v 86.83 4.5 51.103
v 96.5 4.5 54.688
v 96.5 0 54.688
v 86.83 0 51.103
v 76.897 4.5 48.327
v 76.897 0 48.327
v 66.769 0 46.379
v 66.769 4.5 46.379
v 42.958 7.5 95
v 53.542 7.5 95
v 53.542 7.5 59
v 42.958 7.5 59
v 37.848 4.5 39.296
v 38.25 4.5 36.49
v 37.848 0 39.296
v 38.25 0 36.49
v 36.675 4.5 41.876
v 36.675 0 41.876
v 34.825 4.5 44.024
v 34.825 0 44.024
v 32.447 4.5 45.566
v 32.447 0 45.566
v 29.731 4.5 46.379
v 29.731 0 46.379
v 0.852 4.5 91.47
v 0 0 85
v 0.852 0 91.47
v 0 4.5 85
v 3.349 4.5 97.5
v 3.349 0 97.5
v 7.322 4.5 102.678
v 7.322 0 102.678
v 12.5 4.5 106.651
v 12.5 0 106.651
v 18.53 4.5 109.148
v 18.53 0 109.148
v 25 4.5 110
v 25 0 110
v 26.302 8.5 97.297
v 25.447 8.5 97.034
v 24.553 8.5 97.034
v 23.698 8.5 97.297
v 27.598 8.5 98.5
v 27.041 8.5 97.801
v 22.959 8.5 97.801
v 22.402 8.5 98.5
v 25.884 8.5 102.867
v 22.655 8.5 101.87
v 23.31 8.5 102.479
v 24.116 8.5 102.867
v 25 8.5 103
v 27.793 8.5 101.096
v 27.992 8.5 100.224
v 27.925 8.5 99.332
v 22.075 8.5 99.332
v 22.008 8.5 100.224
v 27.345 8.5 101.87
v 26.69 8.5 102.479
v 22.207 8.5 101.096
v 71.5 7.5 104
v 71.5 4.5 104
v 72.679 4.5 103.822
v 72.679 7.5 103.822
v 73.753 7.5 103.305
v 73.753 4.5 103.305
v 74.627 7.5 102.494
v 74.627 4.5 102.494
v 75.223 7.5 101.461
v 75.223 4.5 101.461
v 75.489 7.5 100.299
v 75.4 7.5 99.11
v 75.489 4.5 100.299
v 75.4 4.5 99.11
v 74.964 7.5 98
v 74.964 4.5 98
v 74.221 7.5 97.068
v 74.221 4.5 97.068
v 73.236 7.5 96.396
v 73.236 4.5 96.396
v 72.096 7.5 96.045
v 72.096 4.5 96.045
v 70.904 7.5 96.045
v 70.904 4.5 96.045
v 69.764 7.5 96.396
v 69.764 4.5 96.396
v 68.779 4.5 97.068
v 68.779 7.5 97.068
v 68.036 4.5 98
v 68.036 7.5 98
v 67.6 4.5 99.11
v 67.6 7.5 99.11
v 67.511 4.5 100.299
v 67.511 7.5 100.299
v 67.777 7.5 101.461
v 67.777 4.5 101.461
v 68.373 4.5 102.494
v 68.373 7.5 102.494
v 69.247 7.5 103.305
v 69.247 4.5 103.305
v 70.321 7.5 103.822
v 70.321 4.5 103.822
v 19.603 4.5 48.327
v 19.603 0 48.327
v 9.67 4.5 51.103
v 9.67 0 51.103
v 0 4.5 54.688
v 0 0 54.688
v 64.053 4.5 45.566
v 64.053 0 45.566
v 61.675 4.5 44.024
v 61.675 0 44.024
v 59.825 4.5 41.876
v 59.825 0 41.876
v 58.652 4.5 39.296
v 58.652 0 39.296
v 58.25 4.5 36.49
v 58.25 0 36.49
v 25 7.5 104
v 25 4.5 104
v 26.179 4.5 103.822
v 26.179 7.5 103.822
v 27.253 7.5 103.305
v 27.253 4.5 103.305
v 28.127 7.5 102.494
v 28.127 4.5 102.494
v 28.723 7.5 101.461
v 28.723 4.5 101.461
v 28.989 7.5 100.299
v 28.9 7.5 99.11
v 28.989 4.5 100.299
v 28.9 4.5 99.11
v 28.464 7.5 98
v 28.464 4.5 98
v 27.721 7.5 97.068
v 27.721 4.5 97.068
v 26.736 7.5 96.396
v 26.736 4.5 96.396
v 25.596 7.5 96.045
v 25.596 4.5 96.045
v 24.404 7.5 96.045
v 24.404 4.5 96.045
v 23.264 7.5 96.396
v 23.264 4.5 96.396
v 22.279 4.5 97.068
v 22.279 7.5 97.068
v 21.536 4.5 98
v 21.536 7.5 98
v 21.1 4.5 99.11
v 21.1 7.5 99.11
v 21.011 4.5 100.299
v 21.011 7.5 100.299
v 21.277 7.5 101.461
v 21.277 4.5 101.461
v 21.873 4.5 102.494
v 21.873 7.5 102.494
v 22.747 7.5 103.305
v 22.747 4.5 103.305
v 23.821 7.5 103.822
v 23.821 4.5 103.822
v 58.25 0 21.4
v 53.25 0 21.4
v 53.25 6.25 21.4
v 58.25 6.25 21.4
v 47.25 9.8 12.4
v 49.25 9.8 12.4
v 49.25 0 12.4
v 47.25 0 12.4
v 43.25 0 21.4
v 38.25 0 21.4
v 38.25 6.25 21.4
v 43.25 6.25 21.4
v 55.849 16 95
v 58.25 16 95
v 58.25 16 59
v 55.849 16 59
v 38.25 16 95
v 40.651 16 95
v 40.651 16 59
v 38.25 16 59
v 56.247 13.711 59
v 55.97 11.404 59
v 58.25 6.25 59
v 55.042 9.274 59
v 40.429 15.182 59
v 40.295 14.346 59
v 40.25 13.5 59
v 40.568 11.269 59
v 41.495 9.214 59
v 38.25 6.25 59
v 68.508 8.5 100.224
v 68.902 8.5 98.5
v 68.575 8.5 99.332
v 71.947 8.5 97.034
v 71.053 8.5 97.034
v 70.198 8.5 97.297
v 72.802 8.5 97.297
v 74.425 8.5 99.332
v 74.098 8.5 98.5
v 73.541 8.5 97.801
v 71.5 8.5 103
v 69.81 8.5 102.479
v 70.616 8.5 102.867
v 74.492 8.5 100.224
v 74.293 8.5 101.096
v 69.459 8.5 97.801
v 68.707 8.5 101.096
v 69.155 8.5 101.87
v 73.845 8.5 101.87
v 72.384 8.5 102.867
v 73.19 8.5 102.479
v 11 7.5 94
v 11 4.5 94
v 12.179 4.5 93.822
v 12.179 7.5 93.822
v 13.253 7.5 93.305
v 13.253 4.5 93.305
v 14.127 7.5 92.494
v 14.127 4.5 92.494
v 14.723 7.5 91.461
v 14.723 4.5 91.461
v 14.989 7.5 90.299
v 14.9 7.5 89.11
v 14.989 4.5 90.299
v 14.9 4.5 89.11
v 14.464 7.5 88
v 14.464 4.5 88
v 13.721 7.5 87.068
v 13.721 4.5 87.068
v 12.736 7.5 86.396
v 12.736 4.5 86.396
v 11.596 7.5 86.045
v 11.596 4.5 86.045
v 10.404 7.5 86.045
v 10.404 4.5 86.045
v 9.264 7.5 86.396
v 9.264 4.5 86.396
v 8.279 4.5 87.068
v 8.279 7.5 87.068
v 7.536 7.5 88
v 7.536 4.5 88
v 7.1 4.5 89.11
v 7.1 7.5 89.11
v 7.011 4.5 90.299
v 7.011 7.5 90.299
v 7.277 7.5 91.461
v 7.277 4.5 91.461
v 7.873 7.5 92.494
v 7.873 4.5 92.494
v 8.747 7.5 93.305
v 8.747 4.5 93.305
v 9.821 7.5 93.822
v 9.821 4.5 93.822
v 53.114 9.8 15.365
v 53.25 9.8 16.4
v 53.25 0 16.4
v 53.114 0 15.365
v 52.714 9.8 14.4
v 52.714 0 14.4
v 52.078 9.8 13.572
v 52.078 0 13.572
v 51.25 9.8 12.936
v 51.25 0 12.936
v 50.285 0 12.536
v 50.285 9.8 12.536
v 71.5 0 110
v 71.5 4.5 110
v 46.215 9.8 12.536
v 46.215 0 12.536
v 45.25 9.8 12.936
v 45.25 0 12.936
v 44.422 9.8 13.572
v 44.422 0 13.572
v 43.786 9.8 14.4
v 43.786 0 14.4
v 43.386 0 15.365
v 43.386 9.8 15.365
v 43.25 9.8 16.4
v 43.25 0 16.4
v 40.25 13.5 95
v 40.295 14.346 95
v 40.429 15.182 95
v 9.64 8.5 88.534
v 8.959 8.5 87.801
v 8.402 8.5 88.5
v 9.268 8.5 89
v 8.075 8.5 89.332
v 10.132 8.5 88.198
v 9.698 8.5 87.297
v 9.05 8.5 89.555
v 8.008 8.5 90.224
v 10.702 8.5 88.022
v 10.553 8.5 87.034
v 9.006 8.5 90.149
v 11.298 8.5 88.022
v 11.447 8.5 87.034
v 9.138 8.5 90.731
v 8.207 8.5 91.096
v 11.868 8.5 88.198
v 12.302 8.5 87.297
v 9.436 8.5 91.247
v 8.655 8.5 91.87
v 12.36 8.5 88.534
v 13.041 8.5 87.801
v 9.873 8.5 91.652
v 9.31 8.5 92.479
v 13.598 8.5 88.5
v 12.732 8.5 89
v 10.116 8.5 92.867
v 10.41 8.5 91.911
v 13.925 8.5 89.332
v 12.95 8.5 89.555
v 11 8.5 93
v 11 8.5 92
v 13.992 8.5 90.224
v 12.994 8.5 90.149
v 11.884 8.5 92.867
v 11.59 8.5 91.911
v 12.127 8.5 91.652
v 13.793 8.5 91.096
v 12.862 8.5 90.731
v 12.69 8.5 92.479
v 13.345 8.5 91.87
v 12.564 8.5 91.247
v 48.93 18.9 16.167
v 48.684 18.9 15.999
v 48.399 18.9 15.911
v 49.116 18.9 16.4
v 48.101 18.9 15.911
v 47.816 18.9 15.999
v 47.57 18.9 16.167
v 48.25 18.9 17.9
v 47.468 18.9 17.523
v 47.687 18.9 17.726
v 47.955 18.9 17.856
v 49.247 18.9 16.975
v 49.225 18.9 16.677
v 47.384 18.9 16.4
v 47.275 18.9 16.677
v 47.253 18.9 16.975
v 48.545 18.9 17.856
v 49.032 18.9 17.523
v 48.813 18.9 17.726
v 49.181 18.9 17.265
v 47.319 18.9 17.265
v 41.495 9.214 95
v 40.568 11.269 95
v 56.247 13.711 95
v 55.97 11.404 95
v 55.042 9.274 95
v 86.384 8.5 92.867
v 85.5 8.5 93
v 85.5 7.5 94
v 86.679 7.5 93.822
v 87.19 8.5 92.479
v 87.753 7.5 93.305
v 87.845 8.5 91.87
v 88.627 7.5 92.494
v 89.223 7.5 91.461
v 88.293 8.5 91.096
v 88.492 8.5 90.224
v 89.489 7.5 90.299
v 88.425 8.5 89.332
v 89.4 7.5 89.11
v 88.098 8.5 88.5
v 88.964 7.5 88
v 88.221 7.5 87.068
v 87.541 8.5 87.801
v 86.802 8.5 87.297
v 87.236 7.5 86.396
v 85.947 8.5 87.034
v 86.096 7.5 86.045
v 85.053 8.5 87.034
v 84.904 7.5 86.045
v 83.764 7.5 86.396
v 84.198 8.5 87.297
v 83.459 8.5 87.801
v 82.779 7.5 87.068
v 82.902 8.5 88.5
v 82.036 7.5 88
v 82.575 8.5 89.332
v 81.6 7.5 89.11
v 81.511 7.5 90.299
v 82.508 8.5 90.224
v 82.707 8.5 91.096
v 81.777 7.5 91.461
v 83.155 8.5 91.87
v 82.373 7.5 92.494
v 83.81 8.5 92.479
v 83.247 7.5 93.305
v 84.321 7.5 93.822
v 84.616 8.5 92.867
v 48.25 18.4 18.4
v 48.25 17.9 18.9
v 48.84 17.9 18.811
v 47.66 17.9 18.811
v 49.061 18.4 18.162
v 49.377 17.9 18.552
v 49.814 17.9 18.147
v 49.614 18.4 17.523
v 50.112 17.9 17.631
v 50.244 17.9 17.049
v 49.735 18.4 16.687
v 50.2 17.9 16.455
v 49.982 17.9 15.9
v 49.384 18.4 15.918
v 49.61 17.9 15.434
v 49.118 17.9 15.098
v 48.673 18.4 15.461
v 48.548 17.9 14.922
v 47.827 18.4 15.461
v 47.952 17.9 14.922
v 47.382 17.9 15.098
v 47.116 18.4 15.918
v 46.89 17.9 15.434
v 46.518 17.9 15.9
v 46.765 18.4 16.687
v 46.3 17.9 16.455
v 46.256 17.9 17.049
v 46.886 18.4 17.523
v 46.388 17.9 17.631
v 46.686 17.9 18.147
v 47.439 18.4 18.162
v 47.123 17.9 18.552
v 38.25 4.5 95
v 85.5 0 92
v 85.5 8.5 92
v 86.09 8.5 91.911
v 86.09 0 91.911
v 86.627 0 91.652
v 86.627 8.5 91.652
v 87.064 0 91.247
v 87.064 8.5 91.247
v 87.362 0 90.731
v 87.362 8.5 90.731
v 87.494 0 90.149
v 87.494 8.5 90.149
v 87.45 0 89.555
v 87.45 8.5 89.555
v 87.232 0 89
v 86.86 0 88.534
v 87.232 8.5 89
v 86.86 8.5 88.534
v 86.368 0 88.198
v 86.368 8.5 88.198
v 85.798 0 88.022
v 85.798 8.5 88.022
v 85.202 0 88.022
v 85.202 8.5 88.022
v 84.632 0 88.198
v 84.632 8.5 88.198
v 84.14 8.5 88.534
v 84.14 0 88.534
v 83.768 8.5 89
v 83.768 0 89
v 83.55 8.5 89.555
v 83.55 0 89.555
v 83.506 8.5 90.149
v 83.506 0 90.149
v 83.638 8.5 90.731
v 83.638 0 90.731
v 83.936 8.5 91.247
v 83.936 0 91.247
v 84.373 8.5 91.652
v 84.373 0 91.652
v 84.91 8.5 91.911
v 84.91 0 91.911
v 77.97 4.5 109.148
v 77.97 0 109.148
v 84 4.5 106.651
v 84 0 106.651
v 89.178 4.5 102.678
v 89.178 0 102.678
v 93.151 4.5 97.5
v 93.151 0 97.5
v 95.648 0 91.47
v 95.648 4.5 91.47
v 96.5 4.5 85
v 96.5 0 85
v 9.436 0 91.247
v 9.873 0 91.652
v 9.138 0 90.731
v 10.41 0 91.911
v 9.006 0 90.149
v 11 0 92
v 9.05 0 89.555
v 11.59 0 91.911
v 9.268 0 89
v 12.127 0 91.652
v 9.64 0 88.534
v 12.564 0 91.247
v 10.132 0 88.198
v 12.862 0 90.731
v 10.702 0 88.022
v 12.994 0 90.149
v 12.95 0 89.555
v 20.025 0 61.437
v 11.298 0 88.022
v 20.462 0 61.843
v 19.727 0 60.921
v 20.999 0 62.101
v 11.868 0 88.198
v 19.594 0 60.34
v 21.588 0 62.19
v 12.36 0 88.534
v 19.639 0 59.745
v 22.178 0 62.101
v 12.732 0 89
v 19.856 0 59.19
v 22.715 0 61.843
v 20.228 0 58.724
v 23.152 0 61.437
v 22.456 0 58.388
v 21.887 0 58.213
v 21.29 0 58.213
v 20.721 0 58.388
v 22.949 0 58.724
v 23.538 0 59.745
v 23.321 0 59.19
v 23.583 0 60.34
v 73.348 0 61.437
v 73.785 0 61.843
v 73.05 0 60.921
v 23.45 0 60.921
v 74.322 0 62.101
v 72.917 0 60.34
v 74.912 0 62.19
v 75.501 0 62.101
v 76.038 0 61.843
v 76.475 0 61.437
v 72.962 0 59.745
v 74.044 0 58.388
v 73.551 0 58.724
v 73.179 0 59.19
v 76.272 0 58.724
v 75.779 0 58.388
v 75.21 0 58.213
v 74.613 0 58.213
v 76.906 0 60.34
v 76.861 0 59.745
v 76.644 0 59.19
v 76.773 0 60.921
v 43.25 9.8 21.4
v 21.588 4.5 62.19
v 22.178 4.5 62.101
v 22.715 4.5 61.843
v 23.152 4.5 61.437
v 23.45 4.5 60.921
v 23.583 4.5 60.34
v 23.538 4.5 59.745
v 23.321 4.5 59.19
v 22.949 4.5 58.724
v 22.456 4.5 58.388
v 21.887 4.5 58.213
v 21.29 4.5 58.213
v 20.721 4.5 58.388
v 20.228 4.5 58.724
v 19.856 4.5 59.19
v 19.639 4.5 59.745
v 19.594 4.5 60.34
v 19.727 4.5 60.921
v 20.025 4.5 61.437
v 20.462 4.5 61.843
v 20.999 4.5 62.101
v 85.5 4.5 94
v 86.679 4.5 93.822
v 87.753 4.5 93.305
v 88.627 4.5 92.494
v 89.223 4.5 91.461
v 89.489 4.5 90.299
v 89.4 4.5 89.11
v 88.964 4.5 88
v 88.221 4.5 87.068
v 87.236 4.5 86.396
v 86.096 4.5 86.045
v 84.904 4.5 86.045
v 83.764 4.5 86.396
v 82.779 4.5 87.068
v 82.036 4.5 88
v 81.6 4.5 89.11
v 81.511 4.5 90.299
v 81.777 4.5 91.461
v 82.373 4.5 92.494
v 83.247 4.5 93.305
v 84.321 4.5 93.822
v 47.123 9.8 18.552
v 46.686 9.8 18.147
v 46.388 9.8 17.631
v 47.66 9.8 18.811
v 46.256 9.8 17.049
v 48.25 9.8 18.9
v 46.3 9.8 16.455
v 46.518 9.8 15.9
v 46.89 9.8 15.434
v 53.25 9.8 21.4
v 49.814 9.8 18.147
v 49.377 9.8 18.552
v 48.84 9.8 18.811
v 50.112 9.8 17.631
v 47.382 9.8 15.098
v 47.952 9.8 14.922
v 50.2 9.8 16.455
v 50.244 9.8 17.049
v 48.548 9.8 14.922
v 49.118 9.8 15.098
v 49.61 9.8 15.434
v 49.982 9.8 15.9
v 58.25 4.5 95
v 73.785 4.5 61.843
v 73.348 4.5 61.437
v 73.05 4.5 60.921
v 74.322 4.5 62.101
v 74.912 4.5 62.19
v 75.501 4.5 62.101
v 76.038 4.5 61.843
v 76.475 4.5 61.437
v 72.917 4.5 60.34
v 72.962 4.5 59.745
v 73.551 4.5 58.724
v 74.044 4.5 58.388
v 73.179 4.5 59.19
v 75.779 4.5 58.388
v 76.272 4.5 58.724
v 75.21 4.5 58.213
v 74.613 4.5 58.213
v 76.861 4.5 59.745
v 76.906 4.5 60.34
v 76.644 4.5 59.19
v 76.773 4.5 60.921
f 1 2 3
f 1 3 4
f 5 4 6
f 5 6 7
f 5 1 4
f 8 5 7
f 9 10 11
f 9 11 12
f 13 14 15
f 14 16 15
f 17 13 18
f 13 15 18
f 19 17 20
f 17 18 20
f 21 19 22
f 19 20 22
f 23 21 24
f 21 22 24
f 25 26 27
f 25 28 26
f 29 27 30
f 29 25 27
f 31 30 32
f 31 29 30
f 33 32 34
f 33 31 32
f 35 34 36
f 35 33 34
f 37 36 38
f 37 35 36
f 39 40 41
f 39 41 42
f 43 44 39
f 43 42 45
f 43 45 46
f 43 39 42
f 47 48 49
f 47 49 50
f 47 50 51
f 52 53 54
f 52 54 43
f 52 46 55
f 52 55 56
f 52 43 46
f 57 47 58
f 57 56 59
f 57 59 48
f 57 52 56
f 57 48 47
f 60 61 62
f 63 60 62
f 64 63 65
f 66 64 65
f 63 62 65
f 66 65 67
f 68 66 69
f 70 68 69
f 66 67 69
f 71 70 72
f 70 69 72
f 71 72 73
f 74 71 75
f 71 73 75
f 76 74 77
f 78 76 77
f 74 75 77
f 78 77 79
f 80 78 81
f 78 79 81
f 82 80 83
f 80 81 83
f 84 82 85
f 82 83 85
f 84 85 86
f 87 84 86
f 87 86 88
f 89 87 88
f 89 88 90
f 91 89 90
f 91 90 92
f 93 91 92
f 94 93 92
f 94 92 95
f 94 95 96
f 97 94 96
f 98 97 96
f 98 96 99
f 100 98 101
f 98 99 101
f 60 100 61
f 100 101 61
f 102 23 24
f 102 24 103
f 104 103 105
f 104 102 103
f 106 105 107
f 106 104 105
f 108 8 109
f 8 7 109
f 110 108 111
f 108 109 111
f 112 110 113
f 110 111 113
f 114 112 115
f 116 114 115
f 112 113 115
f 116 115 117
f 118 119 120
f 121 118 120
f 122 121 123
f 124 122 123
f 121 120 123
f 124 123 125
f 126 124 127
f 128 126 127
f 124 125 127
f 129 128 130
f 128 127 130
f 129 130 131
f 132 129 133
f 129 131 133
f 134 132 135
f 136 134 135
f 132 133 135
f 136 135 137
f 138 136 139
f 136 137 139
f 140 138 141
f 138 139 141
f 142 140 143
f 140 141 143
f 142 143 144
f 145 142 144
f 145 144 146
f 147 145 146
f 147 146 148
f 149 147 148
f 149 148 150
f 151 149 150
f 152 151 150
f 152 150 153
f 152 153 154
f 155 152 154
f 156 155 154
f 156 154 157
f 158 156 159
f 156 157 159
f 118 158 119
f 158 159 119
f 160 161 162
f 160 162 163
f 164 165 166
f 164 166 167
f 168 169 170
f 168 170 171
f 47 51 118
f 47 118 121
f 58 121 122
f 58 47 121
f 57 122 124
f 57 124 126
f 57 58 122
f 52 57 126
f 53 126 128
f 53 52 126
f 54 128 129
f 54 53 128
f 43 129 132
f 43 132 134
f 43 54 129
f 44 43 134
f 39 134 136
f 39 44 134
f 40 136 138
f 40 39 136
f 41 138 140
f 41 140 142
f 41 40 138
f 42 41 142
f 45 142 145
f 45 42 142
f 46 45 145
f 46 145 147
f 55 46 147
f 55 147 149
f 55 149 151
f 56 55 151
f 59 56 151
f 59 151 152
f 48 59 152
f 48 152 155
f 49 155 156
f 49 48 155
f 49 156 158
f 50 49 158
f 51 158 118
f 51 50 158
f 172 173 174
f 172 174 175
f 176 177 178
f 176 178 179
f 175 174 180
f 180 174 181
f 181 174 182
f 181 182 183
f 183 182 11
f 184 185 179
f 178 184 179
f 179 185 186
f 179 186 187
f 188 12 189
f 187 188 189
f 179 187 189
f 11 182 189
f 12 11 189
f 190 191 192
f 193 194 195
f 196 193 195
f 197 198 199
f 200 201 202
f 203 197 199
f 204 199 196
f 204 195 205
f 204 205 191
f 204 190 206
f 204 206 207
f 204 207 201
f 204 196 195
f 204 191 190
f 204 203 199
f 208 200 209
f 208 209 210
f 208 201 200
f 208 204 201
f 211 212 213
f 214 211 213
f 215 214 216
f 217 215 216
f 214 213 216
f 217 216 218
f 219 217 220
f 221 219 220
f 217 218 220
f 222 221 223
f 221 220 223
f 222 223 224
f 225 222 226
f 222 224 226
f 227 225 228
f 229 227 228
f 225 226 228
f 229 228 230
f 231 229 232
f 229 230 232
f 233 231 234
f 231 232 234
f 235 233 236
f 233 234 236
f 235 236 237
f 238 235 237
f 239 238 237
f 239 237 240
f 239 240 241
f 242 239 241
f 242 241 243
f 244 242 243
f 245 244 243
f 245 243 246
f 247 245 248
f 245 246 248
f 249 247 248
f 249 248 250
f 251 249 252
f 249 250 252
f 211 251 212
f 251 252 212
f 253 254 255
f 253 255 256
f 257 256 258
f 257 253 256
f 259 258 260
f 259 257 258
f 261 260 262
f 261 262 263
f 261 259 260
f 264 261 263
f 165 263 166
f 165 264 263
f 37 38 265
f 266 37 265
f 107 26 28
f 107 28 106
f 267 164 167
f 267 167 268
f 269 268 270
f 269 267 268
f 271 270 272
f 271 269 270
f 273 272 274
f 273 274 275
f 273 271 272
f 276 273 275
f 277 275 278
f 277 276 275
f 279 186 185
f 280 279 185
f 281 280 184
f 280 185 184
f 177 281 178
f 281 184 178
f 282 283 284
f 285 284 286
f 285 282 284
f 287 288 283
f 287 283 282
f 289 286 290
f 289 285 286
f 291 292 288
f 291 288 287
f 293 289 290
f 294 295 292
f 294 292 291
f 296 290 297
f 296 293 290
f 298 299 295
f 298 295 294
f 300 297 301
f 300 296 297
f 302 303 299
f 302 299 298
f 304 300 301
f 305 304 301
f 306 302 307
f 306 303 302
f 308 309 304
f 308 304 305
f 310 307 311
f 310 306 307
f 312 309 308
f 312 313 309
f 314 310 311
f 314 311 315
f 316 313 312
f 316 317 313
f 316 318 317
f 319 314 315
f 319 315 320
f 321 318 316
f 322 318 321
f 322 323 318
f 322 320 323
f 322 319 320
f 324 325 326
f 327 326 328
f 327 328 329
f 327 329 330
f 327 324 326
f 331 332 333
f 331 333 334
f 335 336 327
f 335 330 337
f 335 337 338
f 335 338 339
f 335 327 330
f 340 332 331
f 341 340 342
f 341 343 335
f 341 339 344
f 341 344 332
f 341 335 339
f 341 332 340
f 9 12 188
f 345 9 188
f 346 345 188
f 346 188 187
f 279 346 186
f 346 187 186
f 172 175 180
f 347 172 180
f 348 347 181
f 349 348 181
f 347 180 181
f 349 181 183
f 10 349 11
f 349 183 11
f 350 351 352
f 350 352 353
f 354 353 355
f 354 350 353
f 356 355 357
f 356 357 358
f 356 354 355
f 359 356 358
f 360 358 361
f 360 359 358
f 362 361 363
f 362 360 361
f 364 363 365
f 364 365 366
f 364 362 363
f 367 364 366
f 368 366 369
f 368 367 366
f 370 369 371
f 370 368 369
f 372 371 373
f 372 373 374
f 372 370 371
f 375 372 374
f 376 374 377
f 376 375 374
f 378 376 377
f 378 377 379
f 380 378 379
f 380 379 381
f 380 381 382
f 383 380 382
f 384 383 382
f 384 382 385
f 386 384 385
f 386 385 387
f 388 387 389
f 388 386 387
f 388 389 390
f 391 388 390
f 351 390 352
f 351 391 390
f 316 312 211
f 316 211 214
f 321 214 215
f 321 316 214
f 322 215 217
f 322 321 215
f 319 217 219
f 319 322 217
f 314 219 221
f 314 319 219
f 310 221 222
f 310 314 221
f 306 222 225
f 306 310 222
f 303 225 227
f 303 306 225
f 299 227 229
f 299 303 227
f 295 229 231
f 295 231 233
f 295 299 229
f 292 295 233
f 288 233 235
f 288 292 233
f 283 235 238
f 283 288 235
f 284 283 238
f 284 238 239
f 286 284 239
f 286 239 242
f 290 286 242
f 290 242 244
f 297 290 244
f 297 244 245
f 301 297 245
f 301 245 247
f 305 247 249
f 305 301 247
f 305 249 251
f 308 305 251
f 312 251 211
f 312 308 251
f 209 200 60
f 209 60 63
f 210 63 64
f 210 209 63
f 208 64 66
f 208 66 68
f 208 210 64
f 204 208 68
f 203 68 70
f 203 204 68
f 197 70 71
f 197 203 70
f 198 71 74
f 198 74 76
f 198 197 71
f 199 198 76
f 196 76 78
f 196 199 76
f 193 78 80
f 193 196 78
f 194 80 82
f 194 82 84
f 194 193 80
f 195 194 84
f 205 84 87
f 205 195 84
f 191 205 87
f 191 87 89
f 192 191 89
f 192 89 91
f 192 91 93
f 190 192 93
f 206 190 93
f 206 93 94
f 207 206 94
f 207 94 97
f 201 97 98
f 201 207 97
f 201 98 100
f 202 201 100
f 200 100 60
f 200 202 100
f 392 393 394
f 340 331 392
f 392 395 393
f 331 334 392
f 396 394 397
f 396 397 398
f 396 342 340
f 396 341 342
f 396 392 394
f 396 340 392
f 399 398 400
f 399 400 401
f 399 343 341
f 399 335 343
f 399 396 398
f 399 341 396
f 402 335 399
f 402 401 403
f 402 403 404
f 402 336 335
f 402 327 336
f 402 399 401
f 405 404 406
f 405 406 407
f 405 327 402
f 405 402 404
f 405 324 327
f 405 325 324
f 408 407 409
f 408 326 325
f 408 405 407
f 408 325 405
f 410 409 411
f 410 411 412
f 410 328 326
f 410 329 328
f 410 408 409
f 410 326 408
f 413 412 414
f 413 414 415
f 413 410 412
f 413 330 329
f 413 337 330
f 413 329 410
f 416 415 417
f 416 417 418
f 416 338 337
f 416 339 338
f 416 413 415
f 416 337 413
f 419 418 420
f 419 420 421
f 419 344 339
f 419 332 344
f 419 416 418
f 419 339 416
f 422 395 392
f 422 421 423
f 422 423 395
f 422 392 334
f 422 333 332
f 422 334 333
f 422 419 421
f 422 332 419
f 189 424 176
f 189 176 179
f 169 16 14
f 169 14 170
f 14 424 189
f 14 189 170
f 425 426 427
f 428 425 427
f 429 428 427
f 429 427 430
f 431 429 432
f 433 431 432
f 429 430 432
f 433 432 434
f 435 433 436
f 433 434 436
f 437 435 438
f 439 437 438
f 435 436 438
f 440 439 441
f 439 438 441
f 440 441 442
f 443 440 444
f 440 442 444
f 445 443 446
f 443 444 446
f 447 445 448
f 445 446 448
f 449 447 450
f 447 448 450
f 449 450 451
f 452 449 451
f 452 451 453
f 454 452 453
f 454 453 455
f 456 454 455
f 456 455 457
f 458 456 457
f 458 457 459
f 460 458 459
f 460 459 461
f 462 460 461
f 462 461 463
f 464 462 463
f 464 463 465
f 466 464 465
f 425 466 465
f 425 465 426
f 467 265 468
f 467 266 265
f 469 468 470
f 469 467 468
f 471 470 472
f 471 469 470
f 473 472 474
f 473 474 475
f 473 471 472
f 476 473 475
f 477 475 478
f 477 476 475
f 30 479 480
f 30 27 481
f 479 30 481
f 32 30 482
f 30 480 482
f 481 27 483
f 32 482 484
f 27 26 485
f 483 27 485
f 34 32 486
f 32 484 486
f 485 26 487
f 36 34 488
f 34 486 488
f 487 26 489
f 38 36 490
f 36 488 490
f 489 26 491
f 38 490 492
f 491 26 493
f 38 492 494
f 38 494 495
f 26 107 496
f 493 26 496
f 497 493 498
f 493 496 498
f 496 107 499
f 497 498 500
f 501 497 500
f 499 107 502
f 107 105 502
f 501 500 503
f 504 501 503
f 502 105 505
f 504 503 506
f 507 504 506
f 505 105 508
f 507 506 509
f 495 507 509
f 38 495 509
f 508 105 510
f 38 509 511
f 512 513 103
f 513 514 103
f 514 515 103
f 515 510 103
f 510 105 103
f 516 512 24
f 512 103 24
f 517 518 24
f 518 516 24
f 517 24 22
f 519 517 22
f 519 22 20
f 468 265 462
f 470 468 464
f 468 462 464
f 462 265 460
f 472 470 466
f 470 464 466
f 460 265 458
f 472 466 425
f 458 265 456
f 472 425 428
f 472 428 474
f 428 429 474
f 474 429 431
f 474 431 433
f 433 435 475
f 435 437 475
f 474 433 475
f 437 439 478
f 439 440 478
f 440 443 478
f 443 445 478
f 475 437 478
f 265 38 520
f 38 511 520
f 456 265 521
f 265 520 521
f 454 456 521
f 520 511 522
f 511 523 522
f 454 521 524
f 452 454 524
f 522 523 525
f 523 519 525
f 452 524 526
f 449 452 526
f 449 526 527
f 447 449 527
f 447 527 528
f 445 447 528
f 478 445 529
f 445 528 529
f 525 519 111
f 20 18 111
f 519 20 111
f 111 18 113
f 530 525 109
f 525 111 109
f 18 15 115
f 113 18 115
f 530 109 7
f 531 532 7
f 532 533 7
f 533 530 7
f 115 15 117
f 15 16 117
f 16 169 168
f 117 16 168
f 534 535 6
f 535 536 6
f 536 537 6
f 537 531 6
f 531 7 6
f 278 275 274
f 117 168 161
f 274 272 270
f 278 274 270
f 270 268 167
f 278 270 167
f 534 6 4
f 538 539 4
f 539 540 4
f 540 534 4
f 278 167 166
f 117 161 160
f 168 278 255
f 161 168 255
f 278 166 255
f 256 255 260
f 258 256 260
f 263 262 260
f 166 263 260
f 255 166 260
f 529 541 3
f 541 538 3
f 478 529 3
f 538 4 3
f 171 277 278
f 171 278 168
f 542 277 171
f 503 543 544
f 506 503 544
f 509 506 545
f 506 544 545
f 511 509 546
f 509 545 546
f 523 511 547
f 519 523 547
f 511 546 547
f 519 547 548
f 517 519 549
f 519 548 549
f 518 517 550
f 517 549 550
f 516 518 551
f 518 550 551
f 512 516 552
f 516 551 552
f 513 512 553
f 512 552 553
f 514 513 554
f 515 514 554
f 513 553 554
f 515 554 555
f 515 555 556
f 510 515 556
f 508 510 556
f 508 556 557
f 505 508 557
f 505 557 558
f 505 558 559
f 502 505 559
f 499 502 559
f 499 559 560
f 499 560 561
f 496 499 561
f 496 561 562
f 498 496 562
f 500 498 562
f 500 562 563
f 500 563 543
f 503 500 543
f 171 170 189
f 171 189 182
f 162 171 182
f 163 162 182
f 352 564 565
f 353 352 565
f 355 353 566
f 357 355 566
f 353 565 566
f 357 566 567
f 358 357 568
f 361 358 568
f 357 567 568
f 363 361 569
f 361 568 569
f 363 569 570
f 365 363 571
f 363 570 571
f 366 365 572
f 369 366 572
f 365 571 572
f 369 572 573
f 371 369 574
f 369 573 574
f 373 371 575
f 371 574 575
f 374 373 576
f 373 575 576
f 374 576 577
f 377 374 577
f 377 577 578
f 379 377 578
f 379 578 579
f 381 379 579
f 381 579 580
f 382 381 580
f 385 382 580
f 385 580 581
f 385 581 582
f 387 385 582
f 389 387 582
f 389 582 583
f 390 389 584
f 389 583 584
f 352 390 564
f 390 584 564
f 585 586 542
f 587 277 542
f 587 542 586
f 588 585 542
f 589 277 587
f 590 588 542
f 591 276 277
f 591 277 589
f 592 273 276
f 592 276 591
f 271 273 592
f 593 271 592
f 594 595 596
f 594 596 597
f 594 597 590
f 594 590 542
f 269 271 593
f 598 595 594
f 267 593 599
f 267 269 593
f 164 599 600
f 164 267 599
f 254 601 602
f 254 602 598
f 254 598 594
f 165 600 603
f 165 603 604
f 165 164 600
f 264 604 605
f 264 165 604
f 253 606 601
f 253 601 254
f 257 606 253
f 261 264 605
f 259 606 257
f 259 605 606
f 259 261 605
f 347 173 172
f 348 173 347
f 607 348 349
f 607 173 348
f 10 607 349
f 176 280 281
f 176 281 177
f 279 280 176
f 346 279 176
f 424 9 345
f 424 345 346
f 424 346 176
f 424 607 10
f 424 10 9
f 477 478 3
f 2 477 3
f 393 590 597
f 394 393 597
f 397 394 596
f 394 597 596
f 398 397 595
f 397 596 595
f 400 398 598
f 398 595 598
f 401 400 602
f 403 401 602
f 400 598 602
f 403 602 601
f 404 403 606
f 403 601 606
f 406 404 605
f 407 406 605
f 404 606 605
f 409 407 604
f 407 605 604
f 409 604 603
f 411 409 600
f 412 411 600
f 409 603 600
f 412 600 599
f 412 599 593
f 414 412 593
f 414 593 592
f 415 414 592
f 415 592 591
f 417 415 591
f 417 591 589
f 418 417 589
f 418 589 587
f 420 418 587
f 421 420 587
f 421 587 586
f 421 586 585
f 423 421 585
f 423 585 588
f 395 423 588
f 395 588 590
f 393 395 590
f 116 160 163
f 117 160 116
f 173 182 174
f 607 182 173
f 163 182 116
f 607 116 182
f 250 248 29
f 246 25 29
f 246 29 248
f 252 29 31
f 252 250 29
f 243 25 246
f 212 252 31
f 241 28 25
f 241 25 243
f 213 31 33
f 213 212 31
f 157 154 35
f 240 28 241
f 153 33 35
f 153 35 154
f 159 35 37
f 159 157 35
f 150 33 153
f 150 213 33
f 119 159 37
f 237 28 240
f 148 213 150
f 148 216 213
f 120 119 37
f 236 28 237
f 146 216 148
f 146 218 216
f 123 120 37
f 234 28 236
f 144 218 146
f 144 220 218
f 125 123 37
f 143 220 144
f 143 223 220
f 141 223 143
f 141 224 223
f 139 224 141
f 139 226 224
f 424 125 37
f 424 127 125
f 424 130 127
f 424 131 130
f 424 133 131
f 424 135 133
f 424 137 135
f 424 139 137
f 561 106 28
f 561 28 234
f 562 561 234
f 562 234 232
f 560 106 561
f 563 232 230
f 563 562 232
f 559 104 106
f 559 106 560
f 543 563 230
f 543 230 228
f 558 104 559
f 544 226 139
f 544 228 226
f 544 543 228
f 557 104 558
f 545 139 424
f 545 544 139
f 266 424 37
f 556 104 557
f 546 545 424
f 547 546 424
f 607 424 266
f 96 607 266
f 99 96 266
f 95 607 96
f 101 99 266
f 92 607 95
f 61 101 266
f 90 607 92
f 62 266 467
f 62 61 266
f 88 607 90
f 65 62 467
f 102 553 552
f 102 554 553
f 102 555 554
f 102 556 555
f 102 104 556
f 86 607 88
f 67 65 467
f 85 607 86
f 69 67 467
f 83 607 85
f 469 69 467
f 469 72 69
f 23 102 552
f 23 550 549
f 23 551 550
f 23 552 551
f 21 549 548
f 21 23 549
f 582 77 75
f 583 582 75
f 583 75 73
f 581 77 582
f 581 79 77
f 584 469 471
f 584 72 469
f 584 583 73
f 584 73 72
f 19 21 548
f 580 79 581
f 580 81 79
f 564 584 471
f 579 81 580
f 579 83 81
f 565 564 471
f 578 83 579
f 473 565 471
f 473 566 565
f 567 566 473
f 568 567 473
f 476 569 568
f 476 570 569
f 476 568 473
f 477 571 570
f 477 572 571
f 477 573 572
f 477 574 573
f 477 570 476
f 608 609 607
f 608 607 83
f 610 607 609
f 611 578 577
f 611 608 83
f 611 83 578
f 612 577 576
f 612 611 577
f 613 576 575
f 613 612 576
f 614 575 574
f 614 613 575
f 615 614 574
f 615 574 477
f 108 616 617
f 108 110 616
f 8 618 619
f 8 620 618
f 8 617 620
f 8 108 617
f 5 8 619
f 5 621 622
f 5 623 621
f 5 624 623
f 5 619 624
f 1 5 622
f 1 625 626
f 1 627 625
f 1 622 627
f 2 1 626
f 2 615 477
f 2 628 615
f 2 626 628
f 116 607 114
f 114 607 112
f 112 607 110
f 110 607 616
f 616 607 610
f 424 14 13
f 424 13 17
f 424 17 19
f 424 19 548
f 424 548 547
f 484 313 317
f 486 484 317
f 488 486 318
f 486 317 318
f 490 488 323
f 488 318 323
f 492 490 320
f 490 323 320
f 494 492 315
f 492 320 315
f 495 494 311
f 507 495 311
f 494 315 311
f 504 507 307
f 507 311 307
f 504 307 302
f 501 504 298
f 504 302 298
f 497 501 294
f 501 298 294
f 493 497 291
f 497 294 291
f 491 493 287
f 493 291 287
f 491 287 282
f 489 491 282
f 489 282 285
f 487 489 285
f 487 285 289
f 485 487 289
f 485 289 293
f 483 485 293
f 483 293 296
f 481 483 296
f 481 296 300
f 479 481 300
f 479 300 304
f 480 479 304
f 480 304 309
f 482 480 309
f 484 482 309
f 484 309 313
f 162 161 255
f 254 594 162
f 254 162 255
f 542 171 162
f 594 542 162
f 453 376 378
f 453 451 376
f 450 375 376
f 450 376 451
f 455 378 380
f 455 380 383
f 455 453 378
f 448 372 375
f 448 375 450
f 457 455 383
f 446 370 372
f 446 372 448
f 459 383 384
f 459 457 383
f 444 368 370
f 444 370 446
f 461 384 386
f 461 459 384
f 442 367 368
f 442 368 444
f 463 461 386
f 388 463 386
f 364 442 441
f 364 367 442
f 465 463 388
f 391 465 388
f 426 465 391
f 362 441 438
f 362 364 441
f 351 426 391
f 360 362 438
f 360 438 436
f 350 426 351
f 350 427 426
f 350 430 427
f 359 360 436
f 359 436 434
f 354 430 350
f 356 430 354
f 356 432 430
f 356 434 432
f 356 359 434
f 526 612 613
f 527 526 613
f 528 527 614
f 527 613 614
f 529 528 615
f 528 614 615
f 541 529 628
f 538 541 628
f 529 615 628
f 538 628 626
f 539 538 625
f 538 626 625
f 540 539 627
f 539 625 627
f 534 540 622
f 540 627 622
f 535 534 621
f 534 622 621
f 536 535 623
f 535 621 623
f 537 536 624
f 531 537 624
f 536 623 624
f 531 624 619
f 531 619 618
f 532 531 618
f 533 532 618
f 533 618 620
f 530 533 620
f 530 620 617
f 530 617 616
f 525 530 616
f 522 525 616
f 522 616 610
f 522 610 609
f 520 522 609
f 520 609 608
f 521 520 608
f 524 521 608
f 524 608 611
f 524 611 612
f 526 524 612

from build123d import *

# Parameters (mm, degrees)
SKETCH1_W           = 96.5
SKETCH1_H           = 110
BOSS_EXTRUDE1_DEPTH = 4.5
SKETCH2_R           = 4
BOSS_EXTRUDE2_DEPTH = 4
SKETCH3_R           = 2
BOSS_EXTRUDE3_DEPTH = 14.4
SKETCH4_W           = 20
SKETCH4_H           = 37.6
BOSS_EXTRUDE4_DEPTH = 1.75
BOSS_EXTRUDE5_DEPTH = 11.5
BOSS_EXTRUDE6_DEPTH = 5.3
CHAMFER2_SIZE       = 1
CUT_EXTRUDE6_DEPTH  = 115.67545509
CHAMFER3_SIZE       = 1
SKETCH2_4_R         = 4
BOSS_EXTRUDE8_DEPTH = 4
CUT_EXTRUDE10_DEPTH = 148.036084007
FILLET1_R           = 10
SKETCH21_R          = 2
CUT_EXTRUDE11_DEPTH = 148.036084007
CHAMFER4_SIZE       = 1
SKETCH22_R          = 2
CUT_EXTRUDE12_DEPTH = 147.698363999
FILLET2_R           = 25


with BuildPart() as part:
    # Sketch1 → Boss-Extrude1 (new body)
    with BuildSketch(Plane(origin=(0, 0, 0), x_dir=(1, 0, 0), z_dir=(0, 1, 0))):
        with Locations((48.25, -55)):
            Rectangle(SKETCH1_W, SKETCH1_H)
    extrude(amount=BOSS_EXTRUDE1_DEPTH)

    # Sketch2 → Boss-Extrude2 (add)
    with BuildSketch(Plane(origin=(0, 4.5, 0), x_dir=(1, 0, 0), z_dir=(0, 1, 0))):
        with Locations(Location((25, -100, 0), (0, 0, 270))):
            Circle(SKETCH2_R)
        with Locations(Location((71.5, -100, 0), (0, 0, 270))):
            Circle(SKETCH2_R)
    extrude(amount=BOSS_EXTRUDE2_DEPTH)

    # Sketch3 → Boss-Extrude3 (add)
    with BuildSketch(Plane(origin=(0, 4.5, 0), x_dir=(1, 0, 0), z_dir=(0, 1, 0))):
        with Locations(Location((48.25, -16.9, 0), (0, 0, 270))):
            Circle(SKETCH3_R)
    extrude(amount=BOSS_EXTRUDE3_DEPTH)

    # Sketch4 → Boss-Extrude4 (add)
    with BuildSketch(Plane(origin=(0, 4.5, 0), x_dir=(1, 0, 0), z_dir=(0, 1, 0))):
        with Locations((48.25, -40.2)):
            Rectangle(SKETCH4_W, SKETCH4_H)
    extrude(amount=BOSS_EXTRUDE4_DEPTH)

    # Sketch4<3> → Boss-Extrude5 (add)
    with BuildSketch(Plane(origin=(0, 4.5, 0), x_dir=(1, 0, 0), z_dir=(0, 1, 0))):
        Polygon((58.25, -59), (58.25, -95), (38.25, -95), (38.25, -59), (48.25, -59), align=None)
    extrude(amount=BOSS_EXTRUDE5_DEPTH)

    # Sketch4<5> → Boss-Extrude6 (add)
    with BuildSketch(Plane(origin=(0, 4.5, 0), x_dir=(1, 0, 0), z_dir=(0, 1, 0))):
        with BuildLine():
            Line((49.25, -12.4), (47.25, -12.4))
            ThreePointArc((47.25, -12.4), (44.421572875, -13.571572875), (43.25, -16.4))
            Line((43.25, -16.4), (43.25, -21.4))
            Line((43.25, -21.4), (53.25, -21.4))
            Line((53.25, -21.4), (53.25, -16.4))
            ThreePointArc((53.25, -16.4), (52.078427125, -13.571572875), (49.25, -12.4))
        make_face()
    extrude(amount=BOSS_EXTRUDE6_DEPTH)

    # Chamfer2
    chamfer2_edges = [part.edges().sort_by_distance(p)[0] for p in [
        (48.25, 18.9, 14.9),
    ]]
    chamfer(chamfer2_edges, length=CHAMFER2_SIZE)

    # Sketch9 → Cut-Extrude6 (cut, through all)
    with BuildSketch(Plane(origin=(0, 0, 59), x_dir=(-1, 0, 0), z_dir=(0, 0, -1))):
        with BuildLine():
            ThreePointArc((-55.849342077, 16), (-55.970490222, 11.403805654), (-53.541502622, 7.5))
            Line((-53.541502622, 7.5), (-42.958497378, 7.5))
            ThreePointArc((-42.958497378, 7.5), (-40.958497378, 10.208497378), (-40.25, 13.5))
            ThreePointArc((-40.25, 13.5), (-40.350799515, 14.765950905), (-40.650657923, 16))
            Line((-40.650657923, 16), (-55.849342077, 16))
        make_face()
    extrude(amount=-CUT_EXTRUDE6_DEPTH, mode=Mode.SUBTRACT)

    # Chamfer3
    chamfer3_edges = [part.edges().sort_by_distance(p)[0] for p in [
        (25, 8.5, 96),
        (71.5, 8.5, 96),
    ]]
    chamfer(chamfer3_edges, length=CHAMFER3_SIZE)

    # Sketch2<4> → Boss-Extrude8 (add)
    with BuildSketch(Plane(origin=(0, 4.5, 0), x_dir=(1, 0, 0), z_dir=(0, 1, 0))):
        with Locations(Location((11, -90, 0), (0, 0, 270))):
            Circle(SKETCH2_4_R)
        with Locations(Location((85.5, -90, 0), (0, 0, 270))):
            Circle(SKETCH2_4_R)
    extrude(amount=BOSS_EXTRUDE8_DEPTH)

    # Sketch20 → Cut-Extrude10 (cut, through all)
    with BuildSketch(Plane(origin=(0, 4.5, 0), x_dir=(1, 0, 0), z_dir=(0, 1, 0))):
        with BuildLine():
            Line((0, 0), (96.5, 0))
            Line((96.5, 0), (96.5, -54.687652439))
            ThreePointArc((96.5, -54.687652439), (77.742842614, -48.529130099), (58.25, -45.400642056))
            Line((58.25, -45.400642056), (58.25, -21.4))
            Line((58.25, -21.4), (53.25, -21.4))
            Line((53.25, -21.4), (53.25, -16.4))
            ThreePointArc((53.25, -16.4), (52.078427125, -13.571572875), (49.25, -12.4))
            Line((49.25, -12.4), (47.25, -12.4))
            ThreePointArc((47.25, -12.4), (44.421572875, -13.571572875), (43.25, -16.4))
            Line((43.25, -16.4), (43.25, -21.4))
            Line((43.25, -21.4), (38.25, -21.4))
            Line((38.25, -21.4), (38.25, -45.400642056))
            ThreePointArc((38.25, -45.400642056), (18.757157386, -48.529130099), (0, -54.687652439))
            Line((0, -54.687652439), (0, 0))
        make_face()
    extrude(amount=-CUT_EXTRUDE10_DEPTH, mode=Mode.SUBTRACT)

    # Fillet1
    fillet1_edges = [part.edges().sort_by_distance(p)[0] for p in [
        (58.25, 2.25, 45.400642056),
        (38.25, 2.25, 45.400642056),
    ]]
    fillet(fillet1_edges, radius=FILLET1_R)

    # Sketch21 → Cut-Extrude11 (cut, through all)
    with BuildSketch(Plane(origin=(0, 4.5, 0), x_dir=(1, 0, 0), z_dir=(0, 1, 0))):
        with Locations(Location((21.588470277, -60.190333609, 0), (0, 0, 270))):
            Circle(SKETCH21_R)
        with Locations(Location((74.911529723, -60.190333609, 0), (0, 0, 270))):
            Circle(SKETCH21_R)
    extrude(amount=-CUT_EXTRUDE11_DEPTH, mode=Mode.SUBTRACT)

    # Chamfer4
    chamfer4_edges = [part.edges().sort_by_distance(p)[0] for p in [
        (11, 8.5, 86),
        (85.5, 8.5, 86),
    ]]
    chamfer(chamfer4_edges, length=CHAMFER4_SIZE)

    # Sketch22 → Cut-Extrude12 (cut, through all)
    with BuildSketch(Plane(origin=(0, 8.5, 0), x_dir=(1, 0, 0), z_dir=(0, 1, 0))):
        with Locations(Location((11, -90, 0), (0, 0, 270))):
            Circle(SKETCH22_R)
        with Locations(Location((85.5, -90, 0), (0, 0, 270))):
            Circle(SKETCH22_R)
    extrude(amount=-CUT_EXTRUDE12_DEPTH, mode=Mode.SUBTRACT)

    # Fillet2
    fillet2_edges = [part.edges().sort_by_distance(p)[0] for p in [
        (96.5, 2.25, 110),
        (0, 2.25, 110),
    ]]
    fillet(fillet2_edges, radius=FILLET2_R)


solid = part.part
